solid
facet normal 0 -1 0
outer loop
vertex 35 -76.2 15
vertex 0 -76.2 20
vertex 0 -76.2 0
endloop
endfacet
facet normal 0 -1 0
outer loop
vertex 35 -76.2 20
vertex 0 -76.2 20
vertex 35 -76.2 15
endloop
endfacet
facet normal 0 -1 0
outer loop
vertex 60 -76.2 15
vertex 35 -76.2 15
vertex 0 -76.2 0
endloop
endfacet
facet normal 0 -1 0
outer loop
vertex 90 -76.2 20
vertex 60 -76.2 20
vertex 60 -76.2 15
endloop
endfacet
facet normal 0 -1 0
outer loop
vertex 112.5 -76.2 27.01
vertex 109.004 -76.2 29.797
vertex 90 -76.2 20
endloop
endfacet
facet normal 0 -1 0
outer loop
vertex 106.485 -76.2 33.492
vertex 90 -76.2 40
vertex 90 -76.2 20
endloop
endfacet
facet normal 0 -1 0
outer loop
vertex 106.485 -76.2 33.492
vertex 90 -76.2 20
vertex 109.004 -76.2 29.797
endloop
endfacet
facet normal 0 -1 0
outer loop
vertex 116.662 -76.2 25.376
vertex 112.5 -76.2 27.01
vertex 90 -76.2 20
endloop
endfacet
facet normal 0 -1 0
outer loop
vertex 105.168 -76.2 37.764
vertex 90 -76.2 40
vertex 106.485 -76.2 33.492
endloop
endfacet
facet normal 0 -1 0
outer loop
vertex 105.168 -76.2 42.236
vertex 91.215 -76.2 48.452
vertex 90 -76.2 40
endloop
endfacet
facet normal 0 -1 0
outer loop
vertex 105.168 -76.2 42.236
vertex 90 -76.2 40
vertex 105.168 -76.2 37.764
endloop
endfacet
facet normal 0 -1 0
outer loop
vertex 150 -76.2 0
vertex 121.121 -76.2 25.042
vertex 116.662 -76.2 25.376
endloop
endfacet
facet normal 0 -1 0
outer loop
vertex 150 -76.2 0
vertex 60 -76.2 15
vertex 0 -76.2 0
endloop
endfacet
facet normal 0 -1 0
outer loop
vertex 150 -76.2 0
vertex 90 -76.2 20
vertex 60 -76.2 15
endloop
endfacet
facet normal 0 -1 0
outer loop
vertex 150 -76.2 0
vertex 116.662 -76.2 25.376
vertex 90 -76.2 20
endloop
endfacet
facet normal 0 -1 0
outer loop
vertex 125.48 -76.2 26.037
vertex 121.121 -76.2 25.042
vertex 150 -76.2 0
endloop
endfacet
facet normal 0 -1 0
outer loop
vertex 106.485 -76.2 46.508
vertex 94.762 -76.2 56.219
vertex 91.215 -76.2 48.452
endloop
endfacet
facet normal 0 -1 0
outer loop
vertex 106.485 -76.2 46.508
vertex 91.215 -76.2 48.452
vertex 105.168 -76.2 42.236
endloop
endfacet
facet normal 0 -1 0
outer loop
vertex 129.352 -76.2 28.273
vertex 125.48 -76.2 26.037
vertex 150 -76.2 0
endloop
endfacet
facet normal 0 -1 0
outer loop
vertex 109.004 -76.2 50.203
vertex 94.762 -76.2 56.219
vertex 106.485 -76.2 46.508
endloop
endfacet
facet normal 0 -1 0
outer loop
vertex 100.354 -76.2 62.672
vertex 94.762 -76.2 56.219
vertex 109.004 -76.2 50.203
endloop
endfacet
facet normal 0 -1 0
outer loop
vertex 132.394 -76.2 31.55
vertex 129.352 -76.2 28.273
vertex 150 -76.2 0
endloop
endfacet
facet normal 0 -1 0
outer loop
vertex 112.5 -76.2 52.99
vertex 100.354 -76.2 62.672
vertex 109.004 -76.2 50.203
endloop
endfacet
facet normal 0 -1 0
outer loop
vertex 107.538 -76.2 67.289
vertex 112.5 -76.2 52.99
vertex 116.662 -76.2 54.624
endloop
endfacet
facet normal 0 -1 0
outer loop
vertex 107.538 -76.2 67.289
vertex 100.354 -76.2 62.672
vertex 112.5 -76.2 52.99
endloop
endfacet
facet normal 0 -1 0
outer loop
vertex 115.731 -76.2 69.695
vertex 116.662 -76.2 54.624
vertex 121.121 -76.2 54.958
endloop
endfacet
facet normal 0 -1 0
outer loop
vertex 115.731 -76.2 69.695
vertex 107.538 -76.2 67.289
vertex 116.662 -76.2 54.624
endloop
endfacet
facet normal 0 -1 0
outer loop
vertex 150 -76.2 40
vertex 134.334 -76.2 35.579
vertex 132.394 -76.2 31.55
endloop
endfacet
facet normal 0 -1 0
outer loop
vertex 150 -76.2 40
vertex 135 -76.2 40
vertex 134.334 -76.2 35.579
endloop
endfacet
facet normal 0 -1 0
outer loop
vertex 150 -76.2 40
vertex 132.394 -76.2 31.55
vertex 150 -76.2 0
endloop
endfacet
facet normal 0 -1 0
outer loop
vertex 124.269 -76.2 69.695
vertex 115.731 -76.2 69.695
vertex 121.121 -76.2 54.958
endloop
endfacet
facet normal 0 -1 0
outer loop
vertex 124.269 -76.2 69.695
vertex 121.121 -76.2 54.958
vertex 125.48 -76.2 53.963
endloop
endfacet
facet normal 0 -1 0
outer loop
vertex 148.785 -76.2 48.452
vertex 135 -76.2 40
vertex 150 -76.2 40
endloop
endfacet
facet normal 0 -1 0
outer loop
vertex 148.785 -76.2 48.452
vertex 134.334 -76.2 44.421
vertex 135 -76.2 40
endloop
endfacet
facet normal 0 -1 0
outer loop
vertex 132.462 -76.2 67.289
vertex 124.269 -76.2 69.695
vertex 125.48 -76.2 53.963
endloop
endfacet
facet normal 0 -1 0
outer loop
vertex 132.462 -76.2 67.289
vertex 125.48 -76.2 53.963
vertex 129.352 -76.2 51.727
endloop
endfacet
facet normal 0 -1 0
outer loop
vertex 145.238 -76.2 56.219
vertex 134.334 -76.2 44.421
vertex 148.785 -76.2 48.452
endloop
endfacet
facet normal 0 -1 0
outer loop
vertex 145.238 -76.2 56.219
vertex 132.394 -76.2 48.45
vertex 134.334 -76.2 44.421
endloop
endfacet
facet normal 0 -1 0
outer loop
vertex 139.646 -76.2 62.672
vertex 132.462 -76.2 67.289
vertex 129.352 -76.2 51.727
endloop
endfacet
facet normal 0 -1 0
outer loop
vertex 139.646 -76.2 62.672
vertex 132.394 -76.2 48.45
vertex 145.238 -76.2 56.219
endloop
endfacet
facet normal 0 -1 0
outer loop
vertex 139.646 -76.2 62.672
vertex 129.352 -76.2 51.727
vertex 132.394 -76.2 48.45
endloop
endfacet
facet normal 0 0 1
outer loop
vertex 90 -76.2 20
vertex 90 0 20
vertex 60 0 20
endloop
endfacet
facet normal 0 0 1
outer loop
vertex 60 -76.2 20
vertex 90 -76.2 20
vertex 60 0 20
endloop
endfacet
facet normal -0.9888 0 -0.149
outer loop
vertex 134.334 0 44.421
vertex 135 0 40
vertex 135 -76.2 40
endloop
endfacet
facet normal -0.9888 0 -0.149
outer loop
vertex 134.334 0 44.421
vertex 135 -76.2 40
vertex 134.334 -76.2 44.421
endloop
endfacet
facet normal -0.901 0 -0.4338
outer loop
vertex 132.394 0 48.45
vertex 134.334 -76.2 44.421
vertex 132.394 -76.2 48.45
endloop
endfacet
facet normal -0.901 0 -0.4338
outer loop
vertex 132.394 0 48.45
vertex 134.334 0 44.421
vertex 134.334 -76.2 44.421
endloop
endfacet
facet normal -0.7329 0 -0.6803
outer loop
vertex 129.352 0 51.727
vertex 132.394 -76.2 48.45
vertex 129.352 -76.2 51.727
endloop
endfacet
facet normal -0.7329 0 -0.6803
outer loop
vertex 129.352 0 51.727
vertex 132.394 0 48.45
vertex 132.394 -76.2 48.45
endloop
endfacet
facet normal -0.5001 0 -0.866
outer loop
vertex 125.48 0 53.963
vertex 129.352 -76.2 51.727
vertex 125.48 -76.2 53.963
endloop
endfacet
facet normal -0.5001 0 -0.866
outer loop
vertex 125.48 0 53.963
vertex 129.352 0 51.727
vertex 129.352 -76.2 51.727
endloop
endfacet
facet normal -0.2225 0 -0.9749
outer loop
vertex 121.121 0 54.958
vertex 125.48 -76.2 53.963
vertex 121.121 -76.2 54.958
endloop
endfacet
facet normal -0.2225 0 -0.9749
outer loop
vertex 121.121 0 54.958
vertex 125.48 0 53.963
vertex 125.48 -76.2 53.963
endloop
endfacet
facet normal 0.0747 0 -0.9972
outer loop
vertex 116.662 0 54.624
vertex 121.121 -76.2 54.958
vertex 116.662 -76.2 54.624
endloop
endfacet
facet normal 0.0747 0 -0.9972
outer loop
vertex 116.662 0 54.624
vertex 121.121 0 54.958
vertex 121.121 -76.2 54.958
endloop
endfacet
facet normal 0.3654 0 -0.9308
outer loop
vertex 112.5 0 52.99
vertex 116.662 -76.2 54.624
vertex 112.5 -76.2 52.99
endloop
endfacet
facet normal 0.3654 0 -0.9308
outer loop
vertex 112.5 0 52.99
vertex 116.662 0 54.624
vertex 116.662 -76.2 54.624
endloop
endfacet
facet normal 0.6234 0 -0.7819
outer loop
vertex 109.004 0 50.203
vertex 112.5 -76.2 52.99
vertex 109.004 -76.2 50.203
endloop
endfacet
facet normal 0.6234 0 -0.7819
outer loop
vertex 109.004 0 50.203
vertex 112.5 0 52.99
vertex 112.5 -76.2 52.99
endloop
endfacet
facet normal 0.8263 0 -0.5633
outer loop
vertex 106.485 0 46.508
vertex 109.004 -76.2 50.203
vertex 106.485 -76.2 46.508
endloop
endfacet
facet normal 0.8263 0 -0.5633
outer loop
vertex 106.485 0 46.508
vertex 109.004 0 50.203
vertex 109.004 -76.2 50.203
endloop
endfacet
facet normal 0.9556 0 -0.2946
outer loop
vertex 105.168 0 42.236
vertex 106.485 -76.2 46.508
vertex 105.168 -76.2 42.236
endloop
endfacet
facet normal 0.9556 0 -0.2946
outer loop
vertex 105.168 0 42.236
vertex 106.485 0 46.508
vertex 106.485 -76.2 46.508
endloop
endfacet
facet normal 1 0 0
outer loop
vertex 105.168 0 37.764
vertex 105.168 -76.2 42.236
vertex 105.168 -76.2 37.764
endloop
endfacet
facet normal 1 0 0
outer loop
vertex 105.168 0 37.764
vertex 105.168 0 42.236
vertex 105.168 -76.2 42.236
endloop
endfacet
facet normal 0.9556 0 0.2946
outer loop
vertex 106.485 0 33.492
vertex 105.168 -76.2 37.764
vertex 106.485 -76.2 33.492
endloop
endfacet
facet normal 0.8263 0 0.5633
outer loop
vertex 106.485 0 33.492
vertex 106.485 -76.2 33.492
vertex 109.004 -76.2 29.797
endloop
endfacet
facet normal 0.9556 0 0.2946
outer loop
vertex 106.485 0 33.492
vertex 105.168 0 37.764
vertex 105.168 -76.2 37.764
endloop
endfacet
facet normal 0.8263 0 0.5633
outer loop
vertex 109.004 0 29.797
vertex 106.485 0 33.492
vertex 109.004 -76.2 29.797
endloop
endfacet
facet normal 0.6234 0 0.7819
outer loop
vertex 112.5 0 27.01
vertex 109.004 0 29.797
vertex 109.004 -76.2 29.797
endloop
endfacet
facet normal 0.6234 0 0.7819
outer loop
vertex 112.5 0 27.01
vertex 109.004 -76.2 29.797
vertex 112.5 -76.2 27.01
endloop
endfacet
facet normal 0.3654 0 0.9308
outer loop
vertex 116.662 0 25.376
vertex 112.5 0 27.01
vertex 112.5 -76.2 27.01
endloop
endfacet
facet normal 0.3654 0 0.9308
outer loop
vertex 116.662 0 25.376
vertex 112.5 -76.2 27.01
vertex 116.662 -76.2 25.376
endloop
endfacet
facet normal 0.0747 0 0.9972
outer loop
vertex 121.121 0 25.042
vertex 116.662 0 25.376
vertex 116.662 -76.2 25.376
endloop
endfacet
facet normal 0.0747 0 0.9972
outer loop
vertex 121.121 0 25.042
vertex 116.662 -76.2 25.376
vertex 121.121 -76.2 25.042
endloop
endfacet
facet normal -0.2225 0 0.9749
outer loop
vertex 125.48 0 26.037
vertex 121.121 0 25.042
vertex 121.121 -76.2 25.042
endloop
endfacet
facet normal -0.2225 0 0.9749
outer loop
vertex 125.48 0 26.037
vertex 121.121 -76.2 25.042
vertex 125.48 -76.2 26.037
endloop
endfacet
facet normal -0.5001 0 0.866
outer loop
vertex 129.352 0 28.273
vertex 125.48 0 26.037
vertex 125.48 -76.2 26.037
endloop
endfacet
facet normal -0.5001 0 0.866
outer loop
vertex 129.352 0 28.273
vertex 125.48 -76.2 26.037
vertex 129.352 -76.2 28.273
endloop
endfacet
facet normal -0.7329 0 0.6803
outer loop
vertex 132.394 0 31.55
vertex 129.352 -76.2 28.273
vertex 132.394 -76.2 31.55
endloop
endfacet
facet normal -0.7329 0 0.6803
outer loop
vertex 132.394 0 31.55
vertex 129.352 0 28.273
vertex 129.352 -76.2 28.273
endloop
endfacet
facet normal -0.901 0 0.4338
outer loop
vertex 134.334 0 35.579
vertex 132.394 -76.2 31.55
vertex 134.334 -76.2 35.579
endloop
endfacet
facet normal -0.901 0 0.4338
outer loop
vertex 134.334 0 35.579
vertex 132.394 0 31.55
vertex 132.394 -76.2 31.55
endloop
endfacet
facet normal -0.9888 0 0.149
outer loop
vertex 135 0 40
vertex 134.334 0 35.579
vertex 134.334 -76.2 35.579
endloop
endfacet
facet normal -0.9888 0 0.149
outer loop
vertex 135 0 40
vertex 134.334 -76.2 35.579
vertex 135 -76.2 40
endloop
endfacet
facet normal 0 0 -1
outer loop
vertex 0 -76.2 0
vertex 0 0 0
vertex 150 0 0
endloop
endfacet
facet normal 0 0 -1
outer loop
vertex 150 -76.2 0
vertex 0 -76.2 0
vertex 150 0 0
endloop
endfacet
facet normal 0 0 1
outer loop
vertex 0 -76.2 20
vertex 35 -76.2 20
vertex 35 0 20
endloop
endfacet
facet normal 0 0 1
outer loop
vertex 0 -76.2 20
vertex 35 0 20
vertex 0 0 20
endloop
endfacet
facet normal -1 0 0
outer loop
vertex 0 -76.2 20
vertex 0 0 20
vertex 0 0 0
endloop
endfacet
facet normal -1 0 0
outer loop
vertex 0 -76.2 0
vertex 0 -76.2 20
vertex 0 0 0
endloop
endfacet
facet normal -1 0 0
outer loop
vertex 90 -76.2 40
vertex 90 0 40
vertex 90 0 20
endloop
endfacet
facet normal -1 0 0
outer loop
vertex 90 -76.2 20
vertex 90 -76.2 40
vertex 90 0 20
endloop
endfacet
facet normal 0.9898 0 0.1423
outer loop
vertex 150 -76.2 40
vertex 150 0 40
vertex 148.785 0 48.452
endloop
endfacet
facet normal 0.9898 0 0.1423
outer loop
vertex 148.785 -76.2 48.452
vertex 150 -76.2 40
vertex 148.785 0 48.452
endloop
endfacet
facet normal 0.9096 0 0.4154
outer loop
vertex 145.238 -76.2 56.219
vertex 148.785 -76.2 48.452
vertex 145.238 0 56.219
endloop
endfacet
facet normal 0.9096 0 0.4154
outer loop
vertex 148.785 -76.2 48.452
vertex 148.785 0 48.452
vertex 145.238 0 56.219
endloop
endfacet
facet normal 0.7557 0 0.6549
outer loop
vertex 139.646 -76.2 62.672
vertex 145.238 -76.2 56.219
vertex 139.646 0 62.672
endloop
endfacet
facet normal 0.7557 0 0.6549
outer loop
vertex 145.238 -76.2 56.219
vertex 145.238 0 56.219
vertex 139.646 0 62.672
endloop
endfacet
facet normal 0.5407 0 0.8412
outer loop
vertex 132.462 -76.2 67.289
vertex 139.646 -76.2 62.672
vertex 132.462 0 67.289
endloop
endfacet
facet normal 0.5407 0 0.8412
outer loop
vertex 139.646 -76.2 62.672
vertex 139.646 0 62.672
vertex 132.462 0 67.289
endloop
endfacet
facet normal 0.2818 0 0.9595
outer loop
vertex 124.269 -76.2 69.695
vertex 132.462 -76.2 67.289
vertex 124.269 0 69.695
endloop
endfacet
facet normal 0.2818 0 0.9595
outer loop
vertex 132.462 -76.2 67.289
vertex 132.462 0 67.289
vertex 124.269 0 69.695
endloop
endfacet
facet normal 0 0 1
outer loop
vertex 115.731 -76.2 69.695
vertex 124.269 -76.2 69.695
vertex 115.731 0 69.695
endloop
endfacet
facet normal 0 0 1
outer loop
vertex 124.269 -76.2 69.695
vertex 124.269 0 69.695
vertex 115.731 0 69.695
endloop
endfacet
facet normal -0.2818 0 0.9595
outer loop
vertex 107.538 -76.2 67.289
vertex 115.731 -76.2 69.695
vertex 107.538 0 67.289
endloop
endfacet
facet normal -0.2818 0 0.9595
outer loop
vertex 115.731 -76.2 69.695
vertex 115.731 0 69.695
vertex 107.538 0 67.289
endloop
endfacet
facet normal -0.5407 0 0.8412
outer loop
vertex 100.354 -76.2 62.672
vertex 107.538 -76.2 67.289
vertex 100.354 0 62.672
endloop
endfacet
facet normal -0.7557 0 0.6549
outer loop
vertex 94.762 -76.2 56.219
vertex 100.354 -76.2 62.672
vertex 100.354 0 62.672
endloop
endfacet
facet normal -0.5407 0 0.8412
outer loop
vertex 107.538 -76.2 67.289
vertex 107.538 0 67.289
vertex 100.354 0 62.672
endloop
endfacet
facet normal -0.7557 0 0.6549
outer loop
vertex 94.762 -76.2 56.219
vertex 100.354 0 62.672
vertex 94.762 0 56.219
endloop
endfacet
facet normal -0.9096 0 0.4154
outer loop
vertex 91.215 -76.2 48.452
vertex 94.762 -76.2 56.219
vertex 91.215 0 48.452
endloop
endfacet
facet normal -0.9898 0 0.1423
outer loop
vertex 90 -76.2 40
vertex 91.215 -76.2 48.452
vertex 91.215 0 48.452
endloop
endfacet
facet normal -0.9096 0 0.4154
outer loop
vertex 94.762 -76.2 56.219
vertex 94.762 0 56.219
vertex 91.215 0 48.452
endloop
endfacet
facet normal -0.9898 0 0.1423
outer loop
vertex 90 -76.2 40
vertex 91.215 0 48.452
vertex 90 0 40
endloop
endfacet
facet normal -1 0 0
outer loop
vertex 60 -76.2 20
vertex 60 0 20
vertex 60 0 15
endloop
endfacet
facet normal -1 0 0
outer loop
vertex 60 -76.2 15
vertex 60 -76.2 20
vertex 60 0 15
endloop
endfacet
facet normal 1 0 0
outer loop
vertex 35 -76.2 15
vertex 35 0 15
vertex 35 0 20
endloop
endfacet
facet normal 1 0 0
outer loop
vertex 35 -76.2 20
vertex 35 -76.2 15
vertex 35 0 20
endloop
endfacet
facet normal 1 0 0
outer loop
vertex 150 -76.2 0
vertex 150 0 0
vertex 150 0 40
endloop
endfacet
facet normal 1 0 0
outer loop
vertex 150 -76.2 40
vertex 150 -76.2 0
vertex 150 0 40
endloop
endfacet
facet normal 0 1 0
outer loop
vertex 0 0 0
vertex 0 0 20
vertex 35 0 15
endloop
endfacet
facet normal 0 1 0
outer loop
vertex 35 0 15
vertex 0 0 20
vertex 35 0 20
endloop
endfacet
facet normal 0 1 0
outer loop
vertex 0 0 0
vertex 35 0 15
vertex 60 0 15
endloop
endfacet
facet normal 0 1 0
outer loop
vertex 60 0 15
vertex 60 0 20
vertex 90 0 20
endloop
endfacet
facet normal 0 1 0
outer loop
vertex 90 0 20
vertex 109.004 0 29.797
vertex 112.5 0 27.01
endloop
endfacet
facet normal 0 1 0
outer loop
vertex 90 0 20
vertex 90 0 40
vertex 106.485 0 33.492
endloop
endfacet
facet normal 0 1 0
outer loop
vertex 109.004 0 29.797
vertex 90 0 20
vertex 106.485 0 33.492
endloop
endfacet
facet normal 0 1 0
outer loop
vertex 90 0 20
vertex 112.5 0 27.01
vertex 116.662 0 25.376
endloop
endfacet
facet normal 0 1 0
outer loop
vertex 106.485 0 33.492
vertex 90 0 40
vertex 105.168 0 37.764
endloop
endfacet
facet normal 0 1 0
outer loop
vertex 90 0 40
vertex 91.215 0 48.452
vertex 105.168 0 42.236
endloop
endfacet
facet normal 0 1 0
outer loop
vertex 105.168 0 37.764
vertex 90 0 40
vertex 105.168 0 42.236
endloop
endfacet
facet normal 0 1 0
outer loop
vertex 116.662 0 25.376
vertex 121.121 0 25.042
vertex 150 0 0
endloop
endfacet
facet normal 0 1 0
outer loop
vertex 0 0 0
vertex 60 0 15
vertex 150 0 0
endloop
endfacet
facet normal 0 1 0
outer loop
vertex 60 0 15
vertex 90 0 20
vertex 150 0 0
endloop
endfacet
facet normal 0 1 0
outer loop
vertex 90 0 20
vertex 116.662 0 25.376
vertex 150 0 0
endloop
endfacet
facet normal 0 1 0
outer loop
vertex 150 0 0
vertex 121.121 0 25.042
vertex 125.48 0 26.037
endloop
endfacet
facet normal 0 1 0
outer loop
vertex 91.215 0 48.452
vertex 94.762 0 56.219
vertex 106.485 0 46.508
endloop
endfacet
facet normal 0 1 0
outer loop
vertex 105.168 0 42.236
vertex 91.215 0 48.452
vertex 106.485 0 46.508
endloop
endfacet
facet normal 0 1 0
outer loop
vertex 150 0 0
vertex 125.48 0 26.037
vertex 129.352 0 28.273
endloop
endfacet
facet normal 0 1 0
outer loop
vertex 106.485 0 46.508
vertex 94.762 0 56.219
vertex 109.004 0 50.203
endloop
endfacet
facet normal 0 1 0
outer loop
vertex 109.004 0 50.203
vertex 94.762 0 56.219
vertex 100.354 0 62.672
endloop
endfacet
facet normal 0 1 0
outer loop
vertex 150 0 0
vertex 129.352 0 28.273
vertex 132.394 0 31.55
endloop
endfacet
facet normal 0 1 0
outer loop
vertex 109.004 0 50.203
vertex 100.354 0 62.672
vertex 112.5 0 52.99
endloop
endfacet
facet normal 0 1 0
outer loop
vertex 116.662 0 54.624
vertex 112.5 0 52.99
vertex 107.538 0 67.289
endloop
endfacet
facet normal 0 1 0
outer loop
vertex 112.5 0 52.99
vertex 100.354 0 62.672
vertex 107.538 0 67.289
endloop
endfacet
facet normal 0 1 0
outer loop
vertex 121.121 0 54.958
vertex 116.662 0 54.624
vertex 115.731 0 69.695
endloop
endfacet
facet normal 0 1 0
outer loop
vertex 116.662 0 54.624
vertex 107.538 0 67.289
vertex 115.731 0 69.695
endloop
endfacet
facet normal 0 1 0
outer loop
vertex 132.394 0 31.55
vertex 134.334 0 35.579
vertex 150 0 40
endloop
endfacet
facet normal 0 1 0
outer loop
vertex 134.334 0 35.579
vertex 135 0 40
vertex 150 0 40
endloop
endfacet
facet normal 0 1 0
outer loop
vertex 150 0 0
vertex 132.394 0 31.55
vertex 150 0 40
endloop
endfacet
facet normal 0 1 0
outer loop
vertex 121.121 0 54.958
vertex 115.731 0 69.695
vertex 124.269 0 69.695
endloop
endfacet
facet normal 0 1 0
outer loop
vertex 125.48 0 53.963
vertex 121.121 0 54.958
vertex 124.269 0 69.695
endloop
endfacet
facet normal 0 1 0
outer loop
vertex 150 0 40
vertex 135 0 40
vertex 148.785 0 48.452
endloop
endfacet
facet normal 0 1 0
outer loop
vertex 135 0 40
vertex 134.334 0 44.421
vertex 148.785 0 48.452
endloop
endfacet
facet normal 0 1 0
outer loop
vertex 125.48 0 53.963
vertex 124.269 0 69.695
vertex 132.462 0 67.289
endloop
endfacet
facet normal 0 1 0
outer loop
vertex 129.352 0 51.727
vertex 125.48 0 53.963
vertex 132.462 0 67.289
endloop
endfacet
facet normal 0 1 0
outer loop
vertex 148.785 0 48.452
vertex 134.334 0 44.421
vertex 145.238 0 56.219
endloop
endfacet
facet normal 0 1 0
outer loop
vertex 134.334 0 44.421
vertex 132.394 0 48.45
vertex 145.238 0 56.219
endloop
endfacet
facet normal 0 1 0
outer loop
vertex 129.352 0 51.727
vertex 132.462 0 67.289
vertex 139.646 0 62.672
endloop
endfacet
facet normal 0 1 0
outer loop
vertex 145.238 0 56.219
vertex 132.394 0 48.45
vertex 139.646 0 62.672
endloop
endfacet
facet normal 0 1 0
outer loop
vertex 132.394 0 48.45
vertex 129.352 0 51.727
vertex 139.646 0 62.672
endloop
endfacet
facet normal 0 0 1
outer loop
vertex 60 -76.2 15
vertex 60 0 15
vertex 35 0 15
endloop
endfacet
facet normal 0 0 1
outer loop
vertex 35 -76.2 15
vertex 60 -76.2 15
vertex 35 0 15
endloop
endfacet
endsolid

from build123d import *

# Parameters (mm, degrees)
F0_R     = 15
F1_DEPTH = 76.2


with BuildPart() as f1:
    # F0 (on Front) → F1 (new body)
    with BuildSketch(Plane.XZ):
        with BuildLine():
            Line((0, 20), (0, 0))
            Line((0, 0), (150, 0))
            Line((150, 0), (150, 40))
            ThreePointArc((150, 40), (120, 70), (90, 40))
            Line((90, 40), (90, 20))
            Line((90, 20), (60, 20))
            Line((60, 20), (60, 15))
            Line((60, 15), (35, 15))
            Line((35, 15), (35, 20))
            Line((35, 20), (0, 20))
        make_face()
        with Locations((120, 40)):
            Circle(F0_R, mode=Mode.SUBTRACT)
    extrude(amount=F1_DEPTH)


solid = f1.part
